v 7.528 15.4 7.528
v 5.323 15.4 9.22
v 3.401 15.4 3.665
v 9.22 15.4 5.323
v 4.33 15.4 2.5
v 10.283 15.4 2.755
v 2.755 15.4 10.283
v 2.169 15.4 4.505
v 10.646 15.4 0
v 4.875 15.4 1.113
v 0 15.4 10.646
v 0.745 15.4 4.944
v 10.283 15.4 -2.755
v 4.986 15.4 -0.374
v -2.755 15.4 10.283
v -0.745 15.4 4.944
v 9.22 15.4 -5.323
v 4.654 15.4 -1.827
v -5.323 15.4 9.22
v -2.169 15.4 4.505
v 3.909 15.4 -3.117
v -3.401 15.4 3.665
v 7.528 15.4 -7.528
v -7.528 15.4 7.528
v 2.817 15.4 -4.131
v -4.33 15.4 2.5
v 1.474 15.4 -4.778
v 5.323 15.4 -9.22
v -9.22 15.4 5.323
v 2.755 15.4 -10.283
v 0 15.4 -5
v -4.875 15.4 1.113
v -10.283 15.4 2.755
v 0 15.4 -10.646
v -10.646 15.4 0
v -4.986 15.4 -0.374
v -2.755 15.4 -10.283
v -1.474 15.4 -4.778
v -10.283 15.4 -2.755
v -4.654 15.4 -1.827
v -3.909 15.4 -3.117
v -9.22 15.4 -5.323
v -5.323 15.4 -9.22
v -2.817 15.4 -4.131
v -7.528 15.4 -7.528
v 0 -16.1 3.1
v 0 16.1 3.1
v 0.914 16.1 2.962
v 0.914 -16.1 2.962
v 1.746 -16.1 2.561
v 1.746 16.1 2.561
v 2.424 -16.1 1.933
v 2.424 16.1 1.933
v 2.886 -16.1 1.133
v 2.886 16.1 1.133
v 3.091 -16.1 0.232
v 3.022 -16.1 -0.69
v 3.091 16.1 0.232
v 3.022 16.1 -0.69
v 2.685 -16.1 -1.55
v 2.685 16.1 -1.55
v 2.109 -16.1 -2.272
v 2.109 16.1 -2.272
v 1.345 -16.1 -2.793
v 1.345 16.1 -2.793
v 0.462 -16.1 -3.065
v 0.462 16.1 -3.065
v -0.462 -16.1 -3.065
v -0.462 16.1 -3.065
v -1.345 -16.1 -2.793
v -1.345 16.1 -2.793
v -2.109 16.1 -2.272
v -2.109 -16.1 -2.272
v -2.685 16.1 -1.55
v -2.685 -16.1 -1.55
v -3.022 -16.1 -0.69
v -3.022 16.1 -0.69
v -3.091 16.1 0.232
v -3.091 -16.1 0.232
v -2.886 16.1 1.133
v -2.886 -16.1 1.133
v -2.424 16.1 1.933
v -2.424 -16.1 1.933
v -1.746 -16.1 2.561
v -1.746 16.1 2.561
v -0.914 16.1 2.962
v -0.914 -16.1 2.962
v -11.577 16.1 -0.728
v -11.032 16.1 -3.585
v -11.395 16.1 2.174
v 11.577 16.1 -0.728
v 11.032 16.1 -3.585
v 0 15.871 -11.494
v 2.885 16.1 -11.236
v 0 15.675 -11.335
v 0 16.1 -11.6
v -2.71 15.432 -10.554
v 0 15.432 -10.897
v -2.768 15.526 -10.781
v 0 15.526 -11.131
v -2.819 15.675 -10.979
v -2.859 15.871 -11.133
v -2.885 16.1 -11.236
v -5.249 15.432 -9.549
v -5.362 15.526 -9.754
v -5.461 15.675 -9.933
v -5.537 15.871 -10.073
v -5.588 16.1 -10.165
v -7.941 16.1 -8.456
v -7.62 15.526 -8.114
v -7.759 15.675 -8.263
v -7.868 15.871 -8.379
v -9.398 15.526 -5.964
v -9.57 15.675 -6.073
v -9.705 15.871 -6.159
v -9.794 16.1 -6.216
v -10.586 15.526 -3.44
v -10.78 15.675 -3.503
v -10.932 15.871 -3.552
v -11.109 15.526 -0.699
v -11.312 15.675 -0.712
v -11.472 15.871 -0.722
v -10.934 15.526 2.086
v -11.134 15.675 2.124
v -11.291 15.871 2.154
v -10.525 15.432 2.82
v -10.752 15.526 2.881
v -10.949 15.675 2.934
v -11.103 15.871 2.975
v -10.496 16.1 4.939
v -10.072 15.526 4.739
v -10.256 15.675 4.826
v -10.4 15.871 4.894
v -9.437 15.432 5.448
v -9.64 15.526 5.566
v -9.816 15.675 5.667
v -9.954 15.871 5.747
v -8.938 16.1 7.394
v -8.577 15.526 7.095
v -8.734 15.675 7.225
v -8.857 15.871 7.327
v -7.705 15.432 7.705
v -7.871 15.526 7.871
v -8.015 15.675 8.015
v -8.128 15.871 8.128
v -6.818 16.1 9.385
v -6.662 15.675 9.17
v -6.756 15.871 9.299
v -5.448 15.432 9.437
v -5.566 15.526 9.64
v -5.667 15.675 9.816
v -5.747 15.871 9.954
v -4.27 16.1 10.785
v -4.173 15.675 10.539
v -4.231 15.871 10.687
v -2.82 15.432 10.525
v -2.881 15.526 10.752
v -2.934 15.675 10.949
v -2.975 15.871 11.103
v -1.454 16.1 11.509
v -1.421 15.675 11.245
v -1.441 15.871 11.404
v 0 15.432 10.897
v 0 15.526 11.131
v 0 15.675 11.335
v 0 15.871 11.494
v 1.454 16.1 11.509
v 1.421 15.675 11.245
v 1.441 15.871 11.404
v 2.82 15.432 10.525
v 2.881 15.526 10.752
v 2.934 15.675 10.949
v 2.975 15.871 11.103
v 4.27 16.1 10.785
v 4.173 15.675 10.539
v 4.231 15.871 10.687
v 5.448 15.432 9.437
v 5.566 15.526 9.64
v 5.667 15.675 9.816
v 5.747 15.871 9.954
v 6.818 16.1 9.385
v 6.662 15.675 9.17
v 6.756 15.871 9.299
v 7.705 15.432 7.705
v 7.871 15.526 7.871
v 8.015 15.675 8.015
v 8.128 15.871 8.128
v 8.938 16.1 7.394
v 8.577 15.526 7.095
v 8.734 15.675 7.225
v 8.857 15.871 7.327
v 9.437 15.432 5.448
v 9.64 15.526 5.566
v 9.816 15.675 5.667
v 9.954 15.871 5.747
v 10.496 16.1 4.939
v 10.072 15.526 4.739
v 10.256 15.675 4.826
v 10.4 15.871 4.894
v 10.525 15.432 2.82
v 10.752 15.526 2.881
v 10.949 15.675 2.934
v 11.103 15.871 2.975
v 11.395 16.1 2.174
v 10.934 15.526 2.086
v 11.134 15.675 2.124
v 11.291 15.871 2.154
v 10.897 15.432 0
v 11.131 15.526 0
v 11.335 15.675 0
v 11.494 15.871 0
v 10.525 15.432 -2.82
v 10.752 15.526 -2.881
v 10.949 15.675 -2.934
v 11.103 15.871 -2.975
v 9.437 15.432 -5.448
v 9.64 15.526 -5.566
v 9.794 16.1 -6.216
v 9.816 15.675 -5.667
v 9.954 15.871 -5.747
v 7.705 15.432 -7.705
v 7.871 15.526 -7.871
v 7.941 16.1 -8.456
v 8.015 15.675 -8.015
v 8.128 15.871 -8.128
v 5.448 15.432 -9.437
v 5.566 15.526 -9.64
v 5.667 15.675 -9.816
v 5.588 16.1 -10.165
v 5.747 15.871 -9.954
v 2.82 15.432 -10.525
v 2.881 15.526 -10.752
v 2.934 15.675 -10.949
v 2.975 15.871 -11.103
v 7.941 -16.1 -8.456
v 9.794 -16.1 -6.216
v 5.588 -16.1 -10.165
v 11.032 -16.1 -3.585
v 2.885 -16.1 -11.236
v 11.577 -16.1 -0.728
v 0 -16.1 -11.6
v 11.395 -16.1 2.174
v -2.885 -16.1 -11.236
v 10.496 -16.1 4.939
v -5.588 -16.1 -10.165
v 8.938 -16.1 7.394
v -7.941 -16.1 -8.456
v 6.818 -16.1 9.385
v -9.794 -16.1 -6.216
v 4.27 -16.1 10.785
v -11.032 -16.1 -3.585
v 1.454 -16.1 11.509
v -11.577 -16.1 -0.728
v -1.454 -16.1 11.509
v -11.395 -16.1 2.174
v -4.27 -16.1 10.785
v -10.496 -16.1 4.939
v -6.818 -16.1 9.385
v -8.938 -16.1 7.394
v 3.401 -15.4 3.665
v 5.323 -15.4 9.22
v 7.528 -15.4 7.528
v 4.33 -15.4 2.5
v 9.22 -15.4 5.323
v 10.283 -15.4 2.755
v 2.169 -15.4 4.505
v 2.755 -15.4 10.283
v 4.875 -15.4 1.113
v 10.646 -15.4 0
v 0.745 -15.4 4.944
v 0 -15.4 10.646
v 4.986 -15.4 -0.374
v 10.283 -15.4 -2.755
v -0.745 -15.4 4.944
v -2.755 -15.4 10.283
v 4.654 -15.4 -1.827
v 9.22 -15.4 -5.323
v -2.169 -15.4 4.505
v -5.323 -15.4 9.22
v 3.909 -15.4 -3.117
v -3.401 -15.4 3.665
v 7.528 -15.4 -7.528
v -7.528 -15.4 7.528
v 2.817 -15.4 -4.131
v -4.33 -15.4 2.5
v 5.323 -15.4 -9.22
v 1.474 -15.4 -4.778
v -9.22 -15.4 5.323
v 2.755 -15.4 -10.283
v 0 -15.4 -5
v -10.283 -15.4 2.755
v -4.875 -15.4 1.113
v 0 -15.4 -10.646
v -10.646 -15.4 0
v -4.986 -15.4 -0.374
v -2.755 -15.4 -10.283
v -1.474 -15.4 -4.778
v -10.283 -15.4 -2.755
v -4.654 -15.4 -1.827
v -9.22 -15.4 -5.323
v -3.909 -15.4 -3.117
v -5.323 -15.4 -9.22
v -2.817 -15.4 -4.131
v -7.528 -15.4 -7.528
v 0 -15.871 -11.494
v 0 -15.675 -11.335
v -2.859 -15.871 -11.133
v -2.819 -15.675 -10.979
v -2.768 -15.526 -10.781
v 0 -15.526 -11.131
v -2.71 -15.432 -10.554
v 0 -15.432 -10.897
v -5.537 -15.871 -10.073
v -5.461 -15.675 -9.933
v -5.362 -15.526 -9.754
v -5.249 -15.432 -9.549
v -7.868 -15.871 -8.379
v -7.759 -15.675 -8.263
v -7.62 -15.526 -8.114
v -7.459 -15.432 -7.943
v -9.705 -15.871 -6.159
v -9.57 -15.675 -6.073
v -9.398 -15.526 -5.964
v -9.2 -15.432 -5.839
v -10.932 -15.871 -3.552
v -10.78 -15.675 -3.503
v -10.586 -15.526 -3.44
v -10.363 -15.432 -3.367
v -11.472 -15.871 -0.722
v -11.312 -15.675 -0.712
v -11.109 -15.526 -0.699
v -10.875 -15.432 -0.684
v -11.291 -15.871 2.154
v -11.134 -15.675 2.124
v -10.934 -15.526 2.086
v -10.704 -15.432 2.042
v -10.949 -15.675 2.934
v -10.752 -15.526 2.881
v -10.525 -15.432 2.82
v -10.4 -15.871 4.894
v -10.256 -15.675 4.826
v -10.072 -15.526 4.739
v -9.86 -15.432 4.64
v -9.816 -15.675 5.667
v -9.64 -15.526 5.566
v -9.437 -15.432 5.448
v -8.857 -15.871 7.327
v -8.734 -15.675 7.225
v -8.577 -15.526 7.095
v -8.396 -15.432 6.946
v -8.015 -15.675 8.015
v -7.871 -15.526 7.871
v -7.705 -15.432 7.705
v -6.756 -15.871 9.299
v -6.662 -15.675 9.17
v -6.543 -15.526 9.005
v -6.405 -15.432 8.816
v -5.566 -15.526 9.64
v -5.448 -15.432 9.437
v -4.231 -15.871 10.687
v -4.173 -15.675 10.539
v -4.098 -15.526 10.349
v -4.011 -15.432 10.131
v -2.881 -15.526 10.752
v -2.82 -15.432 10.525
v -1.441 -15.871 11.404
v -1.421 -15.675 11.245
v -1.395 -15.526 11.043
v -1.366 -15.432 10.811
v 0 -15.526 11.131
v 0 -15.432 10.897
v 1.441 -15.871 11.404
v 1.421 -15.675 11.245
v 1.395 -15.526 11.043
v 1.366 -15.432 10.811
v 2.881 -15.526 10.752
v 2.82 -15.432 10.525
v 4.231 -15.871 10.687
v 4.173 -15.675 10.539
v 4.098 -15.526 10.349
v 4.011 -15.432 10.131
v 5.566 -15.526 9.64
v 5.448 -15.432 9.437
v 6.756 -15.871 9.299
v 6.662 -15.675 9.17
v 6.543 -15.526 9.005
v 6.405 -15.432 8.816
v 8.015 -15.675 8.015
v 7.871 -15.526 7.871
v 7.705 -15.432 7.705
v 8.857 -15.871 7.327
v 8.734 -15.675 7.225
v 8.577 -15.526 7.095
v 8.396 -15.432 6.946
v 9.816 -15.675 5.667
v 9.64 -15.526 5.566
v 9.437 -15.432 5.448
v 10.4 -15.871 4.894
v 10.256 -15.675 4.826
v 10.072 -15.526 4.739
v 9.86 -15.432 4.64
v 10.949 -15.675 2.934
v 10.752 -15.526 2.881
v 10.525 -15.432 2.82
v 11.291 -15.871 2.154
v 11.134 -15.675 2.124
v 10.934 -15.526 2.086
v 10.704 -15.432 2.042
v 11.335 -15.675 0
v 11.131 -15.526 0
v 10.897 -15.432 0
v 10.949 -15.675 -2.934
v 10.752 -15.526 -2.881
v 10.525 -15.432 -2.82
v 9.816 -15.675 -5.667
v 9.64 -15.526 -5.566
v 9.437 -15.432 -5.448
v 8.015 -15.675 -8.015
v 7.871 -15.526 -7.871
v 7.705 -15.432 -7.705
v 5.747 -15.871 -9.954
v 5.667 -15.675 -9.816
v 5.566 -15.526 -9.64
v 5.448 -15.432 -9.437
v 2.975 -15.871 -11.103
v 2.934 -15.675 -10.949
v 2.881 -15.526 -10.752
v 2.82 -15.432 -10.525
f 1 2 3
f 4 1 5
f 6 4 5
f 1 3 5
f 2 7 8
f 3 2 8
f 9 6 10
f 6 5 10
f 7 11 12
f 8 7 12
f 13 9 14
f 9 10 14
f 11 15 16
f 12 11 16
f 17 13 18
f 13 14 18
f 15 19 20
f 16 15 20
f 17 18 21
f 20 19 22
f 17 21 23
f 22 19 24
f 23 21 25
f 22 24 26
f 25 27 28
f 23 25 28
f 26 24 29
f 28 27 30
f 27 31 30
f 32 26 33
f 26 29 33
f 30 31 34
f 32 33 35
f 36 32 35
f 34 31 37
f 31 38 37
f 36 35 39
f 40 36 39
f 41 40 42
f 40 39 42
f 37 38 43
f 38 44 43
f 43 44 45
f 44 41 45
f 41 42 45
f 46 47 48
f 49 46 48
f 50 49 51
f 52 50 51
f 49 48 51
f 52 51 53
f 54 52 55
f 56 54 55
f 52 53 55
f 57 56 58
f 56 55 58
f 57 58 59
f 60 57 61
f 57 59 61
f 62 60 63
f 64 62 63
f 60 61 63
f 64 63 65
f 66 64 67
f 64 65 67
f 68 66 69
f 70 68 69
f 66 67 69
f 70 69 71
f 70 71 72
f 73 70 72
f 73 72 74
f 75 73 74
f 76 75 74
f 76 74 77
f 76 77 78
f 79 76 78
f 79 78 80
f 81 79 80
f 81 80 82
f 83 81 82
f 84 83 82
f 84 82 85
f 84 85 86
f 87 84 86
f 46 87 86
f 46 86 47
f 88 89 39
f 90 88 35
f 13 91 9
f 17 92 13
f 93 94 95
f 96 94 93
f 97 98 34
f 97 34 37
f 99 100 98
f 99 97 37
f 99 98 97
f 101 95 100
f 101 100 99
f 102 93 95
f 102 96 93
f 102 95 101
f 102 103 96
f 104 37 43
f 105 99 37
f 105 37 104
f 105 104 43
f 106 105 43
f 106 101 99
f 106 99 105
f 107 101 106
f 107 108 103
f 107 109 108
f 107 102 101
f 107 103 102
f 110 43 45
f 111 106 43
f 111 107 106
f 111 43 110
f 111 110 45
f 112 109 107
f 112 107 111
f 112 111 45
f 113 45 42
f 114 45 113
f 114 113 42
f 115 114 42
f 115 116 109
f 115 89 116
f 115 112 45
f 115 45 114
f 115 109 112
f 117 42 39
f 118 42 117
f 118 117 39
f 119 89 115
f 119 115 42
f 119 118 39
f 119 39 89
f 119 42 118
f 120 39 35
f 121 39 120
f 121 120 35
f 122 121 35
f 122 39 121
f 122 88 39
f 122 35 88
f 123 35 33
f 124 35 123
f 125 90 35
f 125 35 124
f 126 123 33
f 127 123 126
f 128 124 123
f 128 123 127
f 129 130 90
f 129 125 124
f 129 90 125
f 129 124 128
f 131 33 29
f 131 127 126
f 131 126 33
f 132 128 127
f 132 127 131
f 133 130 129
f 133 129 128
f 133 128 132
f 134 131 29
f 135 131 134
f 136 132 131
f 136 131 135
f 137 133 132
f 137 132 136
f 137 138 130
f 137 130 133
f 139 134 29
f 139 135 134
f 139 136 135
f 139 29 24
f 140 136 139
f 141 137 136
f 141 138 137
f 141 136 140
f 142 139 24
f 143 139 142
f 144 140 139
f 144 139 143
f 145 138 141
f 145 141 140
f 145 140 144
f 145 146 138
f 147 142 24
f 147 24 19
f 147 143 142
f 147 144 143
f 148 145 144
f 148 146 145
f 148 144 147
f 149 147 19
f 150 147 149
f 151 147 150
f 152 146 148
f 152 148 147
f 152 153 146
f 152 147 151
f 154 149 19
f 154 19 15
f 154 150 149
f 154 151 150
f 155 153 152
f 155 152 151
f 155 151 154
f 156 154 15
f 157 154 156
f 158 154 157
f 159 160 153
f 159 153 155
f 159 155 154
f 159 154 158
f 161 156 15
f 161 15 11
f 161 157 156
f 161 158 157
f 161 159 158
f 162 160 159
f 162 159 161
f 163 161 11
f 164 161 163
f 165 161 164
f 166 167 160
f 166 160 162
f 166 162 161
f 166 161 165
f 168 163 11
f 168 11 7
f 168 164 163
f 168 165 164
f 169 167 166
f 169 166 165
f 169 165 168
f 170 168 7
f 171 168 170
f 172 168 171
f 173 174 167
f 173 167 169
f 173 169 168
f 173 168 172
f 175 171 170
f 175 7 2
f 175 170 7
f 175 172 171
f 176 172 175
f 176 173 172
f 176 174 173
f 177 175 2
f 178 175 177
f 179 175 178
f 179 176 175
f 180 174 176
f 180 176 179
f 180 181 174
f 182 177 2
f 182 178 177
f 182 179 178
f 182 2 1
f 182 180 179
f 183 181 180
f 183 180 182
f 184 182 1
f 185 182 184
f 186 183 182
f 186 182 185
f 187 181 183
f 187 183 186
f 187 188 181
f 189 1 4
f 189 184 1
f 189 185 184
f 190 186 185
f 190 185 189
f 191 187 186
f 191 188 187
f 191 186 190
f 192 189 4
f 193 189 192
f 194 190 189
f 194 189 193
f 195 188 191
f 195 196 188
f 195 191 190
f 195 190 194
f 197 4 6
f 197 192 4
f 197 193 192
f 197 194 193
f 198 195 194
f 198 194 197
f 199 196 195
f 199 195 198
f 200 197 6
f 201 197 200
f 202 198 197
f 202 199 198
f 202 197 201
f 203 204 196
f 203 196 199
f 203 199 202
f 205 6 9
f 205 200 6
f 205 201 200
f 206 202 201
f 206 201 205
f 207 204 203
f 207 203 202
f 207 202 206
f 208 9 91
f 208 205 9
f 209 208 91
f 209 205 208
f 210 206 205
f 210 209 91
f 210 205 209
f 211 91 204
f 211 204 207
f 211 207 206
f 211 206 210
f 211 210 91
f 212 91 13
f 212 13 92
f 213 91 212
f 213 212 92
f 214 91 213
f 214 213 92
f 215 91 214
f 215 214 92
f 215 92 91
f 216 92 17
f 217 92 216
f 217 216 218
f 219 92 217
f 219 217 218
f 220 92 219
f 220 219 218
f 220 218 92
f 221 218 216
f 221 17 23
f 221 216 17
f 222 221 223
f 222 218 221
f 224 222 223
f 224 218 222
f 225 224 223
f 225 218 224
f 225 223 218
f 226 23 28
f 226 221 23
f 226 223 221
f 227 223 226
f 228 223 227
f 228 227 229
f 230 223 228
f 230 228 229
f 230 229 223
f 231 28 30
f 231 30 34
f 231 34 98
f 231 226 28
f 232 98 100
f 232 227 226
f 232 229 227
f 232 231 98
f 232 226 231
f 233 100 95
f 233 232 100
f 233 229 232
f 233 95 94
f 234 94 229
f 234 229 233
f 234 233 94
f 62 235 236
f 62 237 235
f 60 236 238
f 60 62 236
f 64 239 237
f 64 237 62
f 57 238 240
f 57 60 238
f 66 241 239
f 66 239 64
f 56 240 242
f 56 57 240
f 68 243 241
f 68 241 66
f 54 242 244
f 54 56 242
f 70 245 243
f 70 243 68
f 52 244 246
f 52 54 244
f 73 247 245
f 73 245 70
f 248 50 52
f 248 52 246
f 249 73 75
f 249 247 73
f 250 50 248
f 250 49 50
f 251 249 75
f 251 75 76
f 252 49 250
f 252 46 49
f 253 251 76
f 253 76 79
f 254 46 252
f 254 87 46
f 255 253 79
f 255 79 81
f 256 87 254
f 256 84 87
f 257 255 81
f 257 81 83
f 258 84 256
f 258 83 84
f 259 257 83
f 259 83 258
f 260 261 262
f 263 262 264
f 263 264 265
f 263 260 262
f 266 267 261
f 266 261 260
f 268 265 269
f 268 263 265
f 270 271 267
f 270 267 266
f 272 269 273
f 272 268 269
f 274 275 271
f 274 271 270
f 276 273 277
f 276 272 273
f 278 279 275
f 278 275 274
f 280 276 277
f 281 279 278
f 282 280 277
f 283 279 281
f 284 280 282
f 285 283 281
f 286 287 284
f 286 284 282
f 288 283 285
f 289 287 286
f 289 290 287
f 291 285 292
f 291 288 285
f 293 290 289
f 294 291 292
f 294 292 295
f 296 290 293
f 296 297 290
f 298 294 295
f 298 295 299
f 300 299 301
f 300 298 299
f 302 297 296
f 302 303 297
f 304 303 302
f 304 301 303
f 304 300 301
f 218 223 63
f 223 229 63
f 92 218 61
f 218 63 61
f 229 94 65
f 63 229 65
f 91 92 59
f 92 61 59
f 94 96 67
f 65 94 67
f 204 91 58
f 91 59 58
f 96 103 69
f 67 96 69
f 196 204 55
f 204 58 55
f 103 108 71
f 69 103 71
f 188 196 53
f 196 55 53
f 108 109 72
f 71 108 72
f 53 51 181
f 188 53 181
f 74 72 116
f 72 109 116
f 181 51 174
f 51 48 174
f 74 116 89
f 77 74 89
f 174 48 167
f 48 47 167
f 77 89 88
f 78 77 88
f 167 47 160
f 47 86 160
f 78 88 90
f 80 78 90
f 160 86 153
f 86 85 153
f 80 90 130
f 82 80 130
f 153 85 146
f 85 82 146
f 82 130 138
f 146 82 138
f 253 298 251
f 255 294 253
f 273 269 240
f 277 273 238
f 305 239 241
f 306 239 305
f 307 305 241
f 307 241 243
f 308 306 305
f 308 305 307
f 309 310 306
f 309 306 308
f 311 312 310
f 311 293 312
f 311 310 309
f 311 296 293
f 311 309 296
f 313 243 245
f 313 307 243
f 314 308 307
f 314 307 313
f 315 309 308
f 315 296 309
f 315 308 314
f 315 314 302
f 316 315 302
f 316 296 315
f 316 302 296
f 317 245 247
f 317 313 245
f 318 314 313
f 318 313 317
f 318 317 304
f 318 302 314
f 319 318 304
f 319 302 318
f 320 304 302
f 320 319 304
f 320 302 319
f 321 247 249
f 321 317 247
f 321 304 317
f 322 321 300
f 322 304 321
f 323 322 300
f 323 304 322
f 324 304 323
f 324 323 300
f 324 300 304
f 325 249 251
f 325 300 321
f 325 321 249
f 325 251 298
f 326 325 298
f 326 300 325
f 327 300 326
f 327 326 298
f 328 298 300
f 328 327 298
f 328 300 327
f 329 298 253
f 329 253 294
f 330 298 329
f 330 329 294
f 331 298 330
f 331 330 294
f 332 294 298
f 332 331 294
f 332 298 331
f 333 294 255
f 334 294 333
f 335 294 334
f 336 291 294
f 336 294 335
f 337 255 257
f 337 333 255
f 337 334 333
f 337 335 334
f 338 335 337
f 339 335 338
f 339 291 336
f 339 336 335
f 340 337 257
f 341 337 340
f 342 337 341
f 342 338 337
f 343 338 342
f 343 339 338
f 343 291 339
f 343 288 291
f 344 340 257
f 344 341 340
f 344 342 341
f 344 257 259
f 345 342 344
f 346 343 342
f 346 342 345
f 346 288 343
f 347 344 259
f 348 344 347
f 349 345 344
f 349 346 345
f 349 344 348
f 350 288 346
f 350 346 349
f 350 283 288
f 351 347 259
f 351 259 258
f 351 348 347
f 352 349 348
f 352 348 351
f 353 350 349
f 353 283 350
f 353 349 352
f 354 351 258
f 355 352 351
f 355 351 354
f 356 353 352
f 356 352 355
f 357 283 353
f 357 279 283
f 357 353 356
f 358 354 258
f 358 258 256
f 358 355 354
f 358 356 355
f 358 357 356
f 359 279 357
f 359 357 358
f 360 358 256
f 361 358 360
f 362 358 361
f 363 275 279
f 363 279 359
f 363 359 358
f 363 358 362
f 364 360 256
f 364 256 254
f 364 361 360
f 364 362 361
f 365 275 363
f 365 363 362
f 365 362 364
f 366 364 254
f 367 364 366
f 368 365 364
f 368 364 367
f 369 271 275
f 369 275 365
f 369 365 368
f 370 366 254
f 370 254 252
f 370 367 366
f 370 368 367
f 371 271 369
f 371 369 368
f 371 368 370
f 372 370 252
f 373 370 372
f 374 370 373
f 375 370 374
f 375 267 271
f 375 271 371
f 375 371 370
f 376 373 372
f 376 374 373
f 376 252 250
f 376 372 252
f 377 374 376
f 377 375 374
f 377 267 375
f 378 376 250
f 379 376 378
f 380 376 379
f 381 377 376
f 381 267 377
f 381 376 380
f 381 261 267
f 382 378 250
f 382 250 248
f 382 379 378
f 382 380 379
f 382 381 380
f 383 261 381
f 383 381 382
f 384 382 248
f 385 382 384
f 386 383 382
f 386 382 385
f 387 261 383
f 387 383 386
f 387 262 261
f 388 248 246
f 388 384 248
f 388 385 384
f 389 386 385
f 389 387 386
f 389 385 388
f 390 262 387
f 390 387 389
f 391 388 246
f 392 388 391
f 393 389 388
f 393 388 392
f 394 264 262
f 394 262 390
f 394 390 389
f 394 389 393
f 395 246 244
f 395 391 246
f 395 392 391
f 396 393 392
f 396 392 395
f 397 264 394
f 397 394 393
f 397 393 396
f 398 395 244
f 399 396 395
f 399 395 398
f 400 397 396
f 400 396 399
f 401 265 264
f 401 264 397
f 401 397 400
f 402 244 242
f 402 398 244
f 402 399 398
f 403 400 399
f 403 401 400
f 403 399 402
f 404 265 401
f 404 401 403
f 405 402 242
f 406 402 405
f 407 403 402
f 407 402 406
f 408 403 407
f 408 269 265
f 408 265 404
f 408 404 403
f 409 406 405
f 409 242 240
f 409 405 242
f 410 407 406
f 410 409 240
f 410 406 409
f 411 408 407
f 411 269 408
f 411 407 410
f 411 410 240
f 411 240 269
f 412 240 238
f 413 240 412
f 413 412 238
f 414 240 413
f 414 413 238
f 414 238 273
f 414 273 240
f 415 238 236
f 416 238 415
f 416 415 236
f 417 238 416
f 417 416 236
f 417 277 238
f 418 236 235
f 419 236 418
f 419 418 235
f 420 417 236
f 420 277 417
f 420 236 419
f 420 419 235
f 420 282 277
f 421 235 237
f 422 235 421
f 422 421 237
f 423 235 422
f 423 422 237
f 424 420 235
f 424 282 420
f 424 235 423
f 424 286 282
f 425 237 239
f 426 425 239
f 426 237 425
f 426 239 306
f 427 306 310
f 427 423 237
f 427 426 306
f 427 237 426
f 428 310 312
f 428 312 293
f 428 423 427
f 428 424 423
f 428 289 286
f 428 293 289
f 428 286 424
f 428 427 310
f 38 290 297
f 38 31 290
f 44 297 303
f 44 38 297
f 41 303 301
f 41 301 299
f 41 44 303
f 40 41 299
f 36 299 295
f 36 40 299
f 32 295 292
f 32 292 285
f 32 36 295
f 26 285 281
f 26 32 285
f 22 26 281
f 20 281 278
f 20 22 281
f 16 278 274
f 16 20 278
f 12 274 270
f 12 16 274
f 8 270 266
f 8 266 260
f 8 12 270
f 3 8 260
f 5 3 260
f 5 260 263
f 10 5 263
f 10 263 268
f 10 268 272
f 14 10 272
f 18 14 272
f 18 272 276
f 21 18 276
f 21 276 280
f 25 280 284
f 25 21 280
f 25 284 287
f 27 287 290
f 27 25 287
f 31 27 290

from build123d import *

# Parameters (mm, degrees)
SKETCH2_R          = 3.1
CUT_EXTRUDE1_DEPTH = 37.13806857
FILLET1_R          = 1


with BuildPart() as part:
    # Sketch1 → Revolve1 (revolve)
    with BuildSketch(Plane.XY, mode=Mode.PRIVATE) as revolve1_sk:
        Polygon((0, 0), (0, 16.1), (11.6, 16.1), (11.6, 15.4), (5, 15.4), (5, 0), align=None)
    revolve(revolve1_sk.sketch.rotate(Axis((0, 24.358616114, 0), (0, 1, 0)), 90), axis=Axis((0, 24.358616114, 0), (0, 1, 0)))

    # Mirror1: part across plane


with BuildPart() as part_1:
    add(part.part)
    add(part.part.mirror(Plane(origin=(5, 0, 0), x_dir=(0, 0, 1), z_dir=(0, -1, 0))))

    # Sketch2 → Cut-Extrude1 (cut, through all)
    with BuildSketch(Plane(origin=(0, 16.1, 0), x_dir=(1, 0, 0), z_dir=(0, 1, 0))):
        with Locations(Location((0, 0, 0), (0, 0, 270))):
            Circle(SKETCH2_R)
    extrude(amount=-CUT_EXTRUDE1_DEPTH, mode=Mode.SUBTRACT)

    # Fillet1
    # the kernel refuses this fillet: 1 mm, written as the material it takes off along each edge
    with BuildSketch(Plane(origin=(0, -15.4, 0), x_dir=(0, 0, -1), z_dir=(1, 0, 0))) as fillet1_piece_1:
        with BuildLine():
            CenterArc((10.646060799, -1), FILLET1_R, 17.457603124, 72.542396876)
            Line((10.646060799, 0), (10.646060799, 0.02))
            Line((10.646060799, 0.02), (11.6, 0.02))
            Line((11.6, 0.02), (11.62, 0))
            ThreePointArc((11.62, 0), (11.62, -0.35), (11.619078784, -0.694))
            Line((11.619078784, -0.694), (11.6, -0.7))
        make_face()
    revolve(axis=Axis((0, -15.4, 0), (0, 1, 0)), mode=Mode.SUBTRACT)
    with BuildSketch(Plane(origin=(0, 15.4, 0), x_dir=(0, 0, -1), z_dir=(1, 0, 0))) as fillet1_piece_2:
        with BuildLine():
            CenterArc((10.646060799, 1), FILLET1_R, 270, 72.542396876)
            Line((10.646060799, 0), (10.646060799, -0.02))
            Line((10.646060799, -0.02), (11.6, -0.02))
            Line((11.6, -0.02), (11.62, 0))
            ThreePointArc((11.62, 0), (11.62, 0.35), (11.619078784, 0.694))
            Line((11.619078784, 0.694), (11.6, 0.7))
        make_face()
    revolve(axis=Axis((0, 15.4, 0), (0, 1, 0)), mode=Mode.SUBTRACT)


solid = part_1.part
